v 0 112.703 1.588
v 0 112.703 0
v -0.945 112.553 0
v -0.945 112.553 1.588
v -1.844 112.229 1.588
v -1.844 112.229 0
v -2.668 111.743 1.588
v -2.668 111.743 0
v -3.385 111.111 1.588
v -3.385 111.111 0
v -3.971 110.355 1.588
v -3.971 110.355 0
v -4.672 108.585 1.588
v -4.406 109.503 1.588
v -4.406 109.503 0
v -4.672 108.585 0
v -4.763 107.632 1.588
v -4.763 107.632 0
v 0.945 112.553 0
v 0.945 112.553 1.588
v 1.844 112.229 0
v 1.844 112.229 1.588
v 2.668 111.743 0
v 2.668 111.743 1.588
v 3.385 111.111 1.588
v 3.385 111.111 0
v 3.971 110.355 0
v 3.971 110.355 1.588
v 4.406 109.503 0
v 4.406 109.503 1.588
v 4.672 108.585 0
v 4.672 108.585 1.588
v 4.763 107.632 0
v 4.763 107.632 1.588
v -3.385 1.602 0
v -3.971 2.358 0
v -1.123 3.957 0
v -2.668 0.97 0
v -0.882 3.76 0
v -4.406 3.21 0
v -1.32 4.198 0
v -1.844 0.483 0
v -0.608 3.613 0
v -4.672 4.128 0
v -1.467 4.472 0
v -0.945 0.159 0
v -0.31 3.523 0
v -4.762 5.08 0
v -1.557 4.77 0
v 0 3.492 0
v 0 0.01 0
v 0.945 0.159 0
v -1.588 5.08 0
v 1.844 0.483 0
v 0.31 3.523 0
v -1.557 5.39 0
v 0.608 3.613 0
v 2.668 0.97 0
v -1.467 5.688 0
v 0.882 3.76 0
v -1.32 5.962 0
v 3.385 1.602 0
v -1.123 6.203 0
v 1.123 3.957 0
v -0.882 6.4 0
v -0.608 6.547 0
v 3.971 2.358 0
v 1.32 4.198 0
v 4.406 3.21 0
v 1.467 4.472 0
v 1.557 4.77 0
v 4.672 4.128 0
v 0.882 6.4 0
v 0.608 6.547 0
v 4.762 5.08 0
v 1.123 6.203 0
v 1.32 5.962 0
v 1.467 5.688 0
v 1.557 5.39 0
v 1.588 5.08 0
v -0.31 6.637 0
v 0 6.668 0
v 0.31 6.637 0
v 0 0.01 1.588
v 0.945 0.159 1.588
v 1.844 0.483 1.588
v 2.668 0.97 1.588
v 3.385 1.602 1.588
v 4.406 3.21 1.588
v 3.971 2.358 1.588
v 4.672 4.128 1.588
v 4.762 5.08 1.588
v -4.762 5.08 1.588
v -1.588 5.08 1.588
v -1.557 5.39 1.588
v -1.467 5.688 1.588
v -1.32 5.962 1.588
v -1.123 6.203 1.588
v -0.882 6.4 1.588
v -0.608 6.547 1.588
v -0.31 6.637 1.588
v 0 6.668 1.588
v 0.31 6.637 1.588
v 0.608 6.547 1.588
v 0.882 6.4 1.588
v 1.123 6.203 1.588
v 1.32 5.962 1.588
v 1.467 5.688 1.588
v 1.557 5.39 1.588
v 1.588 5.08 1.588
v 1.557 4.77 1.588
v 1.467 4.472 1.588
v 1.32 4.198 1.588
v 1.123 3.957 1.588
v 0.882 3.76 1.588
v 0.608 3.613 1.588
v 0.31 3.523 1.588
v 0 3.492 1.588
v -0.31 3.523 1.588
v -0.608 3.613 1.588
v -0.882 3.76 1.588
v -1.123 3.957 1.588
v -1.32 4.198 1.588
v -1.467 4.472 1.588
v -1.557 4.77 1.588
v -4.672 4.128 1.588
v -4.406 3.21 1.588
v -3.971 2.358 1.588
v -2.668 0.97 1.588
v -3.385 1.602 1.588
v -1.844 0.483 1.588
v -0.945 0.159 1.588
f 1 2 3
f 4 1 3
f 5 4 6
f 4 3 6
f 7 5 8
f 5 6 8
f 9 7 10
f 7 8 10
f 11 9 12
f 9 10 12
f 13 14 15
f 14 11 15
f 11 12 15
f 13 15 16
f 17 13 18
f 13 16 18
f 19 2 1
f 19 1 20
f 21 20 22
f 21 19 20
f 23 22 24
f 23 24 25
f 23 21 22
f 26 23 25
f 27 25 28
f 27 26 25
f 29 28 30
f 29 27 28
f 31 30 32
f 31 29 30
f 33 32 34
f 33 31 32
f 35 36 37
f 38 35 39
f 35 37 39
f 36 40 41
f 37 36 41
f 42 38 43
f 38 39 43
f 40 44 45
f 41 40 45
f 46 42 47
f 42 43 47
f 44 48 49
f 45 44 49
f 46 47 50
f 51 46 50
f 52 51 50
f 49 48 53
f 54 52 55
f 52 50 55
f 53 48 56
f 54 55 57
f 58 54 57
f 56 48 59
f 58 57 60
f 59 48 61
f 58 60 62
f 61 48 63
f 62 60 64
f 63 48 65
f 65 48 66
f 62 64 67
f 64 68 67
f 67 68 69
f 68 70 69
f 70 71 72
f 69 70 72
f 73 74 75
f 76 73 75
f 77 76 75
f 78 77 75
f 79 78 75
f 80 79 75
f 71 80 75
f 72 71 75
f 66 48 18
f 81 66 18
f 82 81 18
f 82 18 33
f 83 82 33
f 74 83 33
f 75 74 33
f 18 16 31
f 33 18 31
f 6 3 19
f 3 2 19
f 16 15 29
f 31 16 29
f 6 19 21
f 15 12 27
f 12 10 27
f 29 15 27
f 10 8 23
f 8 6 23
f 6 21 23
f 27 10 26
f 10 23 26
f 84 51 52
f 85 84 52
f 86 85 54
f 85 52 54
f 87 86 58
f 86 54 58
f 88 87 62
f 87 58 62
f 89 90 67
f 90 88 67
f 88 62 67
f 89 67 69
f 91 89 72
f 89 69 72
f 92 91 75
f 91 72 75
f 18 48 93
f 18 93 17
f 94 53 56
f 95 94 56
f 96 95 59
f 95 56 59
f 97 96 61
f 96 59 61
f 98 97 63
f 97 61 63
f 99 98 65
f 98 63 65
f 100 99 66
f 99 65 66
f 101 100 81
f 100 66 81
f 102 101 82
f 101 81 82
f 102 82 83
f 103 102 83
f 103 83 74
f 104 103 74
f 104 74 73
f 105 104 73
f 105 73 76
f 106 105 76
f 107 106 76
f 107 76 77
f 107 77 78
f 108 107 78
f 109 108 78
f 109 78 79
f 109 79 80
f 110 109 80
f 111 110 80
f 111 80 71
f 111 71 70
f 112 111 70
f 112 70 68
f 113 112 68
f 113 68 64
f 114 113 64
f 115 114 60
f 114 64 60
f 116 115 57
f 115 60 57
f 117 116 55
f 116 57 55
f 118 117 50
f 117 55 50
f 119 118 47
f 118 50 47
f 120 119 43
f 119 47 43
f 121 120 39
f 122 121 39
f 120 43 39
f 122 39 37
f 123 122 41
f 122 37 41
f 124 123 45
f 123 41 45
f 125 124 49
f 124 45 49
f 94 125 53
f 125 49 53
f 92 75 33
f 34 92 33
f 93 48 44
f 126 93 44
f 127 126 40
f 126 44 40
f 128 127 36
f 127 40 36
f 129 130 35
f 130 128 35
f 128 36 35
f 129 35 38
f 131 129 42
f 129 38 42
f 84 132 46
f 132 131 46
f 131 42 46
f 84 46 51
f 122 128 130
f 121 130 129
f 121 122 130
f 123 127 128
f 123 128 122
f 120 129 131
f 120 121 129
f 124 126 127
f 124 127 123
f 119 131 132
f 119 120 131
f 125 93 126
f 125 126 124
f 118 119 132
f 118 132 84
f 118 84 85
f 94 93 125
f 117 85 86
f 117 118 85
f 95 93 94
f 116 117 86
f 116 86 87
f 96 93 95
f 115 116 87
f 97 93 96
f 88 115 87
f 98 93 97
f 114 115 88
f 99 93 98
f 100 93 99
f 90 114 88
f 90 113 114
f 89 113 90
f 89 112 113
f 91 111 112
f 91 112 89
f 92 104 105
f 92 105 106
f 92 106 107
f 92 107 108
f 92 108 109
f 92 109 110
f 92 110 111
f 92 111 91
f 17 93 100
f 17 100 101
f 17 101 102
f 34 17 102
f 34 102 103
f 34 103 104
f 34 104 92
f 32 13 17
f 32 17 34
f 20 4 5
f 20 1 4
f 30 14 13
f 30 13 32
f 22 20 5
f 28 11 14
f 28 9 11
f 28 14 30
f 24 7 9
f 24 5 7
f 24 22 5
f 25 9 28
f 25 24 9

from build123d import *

# Parameters (mm, degrees)
F0_W        = 9.525
F0_H        = 112.7125
F1_DEPTH    = 1.5875
F2_T1_DEPTH = 26.9875
F4_D        = 3.175


# Not quite as in the source:
# - a fillet or chamfer that OpenCascade refuses, or shapes differently, is made with other operations: its cross-section is extruded or revolved along the edge and cut away or added


with BuildPart() as f1:
    # F0 (on Top) → F1 (new body)
    with BuildSketch(Plane.XY):
        with Locations((0, 56.35625)):
            Rectangle(F0_W, F0_H)
    extrude(amount=F1_DEPTH)

    # F2: fillet of radius 5.08 on 4 edges, made by hand

    # F2_s2 → F2_t1 (cut)
    with BuildSketch(Plane.XY.offset(-12.7)):
        with BuildLine():
            ThreePointArc((-0.3175, 0), (3.2746024484, 1.4878975516), (4.7625, 5.08))
            Line((4.7625, 5.08), (4.7625, 0))
            Line((4.7625, 0), (-0.3175, 0))
        make_face()
        with BuildLine():
            ThreePointArc((-4.7625, 5.08), (-3.2746024484, 1.4878975516), (0.3175, 0))
            Line((0.3175, 0), (-4.7625, 0))
            Line((-4.7625, 0), (-4.7625, 5.08))
        make_face()
        with BuildLine():
            ThreePointArc((-0.3175, 112.7125), (3.2746024484, 111.2246024484), (4.7625, 107.6325))
            Line((4.7625, 107.6325), (4.7625, 112.7125))
            Line((4.7625, 112.7125), (-0.3175, 112.7125))
        make_face()
        with BuildLine():
            ThreePointArc((0.3175, 112.7125), (-3.2746024484, 111.2246024484), (-4.7625, 107.6325))
            Line((-4.7625, 107.6325), (-4.7625, 112.7125))
            Line((-4.7625, 112.7125), (0.3175, 112.7125))
        make_face()
    extrude(amount=F2_T1_DEPTH, mode=Mode.SUBTRACT)

    # F4 (through all)
    with Locations(Plane.XY.offset(1.5875)):
        with Locations((0, 5.08)):
            Hole(F4_D / 2)


solid = f1.part
